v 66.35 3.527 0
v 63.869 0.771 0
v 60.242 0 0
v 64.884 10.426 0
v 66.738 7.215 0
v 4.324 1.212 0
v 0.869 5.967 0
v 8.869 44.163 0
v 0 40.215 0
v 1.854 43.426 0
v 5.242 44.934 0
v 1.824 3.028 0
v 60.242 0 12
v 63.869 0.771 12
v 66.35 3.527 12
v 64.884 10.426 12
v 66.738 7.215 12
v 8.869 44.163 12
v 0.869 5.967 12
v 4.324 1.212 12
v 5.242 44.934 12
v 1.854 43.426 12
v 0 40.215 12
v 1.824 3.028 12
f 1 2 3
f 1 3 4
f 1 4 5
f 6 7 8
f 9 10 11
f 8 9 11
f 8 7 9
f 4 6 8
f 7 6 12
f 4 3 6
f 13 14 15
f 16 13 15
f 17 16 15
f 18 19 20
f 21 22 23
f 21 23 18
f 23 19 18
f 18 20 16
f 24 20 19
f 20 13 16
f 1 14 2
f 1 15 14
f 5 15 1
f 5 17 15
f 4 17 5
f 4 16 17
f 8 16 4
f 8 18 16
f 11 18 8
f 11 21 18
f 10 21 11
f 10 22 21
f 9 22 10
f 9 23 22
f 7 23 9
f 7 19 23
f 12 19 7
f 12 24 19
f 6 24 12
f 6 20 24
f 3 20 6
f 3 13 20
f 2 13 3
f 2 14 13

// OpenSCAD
$fn = 32;

// ----------------------------------------------------------------------
// Lever arm: two bosses 10 and 12 mm, 55 mm between centres
// ----------------------------------------------------------------------

// --- parameters (mm) ---
profile_height = 12;      // extrusion height
profile_points = 12;      // points of the closed outline

profile = [[0, 40.215], [0.869, 5.967], [1.824, 3.028], [4.324, 1.212], [60.242, 0], [63.869, 0.771], [66.35, 3.527], [66.738, 7.215], [64.884, 10.426], [8.869, 44.163], [5.242, 44.934], [1.854, 43.426]];  // single closed polygon, 12 points, counter clockwise

// --- the one profile operation ---
linear_extrude(height = profile_height) polygon(points = profile);
